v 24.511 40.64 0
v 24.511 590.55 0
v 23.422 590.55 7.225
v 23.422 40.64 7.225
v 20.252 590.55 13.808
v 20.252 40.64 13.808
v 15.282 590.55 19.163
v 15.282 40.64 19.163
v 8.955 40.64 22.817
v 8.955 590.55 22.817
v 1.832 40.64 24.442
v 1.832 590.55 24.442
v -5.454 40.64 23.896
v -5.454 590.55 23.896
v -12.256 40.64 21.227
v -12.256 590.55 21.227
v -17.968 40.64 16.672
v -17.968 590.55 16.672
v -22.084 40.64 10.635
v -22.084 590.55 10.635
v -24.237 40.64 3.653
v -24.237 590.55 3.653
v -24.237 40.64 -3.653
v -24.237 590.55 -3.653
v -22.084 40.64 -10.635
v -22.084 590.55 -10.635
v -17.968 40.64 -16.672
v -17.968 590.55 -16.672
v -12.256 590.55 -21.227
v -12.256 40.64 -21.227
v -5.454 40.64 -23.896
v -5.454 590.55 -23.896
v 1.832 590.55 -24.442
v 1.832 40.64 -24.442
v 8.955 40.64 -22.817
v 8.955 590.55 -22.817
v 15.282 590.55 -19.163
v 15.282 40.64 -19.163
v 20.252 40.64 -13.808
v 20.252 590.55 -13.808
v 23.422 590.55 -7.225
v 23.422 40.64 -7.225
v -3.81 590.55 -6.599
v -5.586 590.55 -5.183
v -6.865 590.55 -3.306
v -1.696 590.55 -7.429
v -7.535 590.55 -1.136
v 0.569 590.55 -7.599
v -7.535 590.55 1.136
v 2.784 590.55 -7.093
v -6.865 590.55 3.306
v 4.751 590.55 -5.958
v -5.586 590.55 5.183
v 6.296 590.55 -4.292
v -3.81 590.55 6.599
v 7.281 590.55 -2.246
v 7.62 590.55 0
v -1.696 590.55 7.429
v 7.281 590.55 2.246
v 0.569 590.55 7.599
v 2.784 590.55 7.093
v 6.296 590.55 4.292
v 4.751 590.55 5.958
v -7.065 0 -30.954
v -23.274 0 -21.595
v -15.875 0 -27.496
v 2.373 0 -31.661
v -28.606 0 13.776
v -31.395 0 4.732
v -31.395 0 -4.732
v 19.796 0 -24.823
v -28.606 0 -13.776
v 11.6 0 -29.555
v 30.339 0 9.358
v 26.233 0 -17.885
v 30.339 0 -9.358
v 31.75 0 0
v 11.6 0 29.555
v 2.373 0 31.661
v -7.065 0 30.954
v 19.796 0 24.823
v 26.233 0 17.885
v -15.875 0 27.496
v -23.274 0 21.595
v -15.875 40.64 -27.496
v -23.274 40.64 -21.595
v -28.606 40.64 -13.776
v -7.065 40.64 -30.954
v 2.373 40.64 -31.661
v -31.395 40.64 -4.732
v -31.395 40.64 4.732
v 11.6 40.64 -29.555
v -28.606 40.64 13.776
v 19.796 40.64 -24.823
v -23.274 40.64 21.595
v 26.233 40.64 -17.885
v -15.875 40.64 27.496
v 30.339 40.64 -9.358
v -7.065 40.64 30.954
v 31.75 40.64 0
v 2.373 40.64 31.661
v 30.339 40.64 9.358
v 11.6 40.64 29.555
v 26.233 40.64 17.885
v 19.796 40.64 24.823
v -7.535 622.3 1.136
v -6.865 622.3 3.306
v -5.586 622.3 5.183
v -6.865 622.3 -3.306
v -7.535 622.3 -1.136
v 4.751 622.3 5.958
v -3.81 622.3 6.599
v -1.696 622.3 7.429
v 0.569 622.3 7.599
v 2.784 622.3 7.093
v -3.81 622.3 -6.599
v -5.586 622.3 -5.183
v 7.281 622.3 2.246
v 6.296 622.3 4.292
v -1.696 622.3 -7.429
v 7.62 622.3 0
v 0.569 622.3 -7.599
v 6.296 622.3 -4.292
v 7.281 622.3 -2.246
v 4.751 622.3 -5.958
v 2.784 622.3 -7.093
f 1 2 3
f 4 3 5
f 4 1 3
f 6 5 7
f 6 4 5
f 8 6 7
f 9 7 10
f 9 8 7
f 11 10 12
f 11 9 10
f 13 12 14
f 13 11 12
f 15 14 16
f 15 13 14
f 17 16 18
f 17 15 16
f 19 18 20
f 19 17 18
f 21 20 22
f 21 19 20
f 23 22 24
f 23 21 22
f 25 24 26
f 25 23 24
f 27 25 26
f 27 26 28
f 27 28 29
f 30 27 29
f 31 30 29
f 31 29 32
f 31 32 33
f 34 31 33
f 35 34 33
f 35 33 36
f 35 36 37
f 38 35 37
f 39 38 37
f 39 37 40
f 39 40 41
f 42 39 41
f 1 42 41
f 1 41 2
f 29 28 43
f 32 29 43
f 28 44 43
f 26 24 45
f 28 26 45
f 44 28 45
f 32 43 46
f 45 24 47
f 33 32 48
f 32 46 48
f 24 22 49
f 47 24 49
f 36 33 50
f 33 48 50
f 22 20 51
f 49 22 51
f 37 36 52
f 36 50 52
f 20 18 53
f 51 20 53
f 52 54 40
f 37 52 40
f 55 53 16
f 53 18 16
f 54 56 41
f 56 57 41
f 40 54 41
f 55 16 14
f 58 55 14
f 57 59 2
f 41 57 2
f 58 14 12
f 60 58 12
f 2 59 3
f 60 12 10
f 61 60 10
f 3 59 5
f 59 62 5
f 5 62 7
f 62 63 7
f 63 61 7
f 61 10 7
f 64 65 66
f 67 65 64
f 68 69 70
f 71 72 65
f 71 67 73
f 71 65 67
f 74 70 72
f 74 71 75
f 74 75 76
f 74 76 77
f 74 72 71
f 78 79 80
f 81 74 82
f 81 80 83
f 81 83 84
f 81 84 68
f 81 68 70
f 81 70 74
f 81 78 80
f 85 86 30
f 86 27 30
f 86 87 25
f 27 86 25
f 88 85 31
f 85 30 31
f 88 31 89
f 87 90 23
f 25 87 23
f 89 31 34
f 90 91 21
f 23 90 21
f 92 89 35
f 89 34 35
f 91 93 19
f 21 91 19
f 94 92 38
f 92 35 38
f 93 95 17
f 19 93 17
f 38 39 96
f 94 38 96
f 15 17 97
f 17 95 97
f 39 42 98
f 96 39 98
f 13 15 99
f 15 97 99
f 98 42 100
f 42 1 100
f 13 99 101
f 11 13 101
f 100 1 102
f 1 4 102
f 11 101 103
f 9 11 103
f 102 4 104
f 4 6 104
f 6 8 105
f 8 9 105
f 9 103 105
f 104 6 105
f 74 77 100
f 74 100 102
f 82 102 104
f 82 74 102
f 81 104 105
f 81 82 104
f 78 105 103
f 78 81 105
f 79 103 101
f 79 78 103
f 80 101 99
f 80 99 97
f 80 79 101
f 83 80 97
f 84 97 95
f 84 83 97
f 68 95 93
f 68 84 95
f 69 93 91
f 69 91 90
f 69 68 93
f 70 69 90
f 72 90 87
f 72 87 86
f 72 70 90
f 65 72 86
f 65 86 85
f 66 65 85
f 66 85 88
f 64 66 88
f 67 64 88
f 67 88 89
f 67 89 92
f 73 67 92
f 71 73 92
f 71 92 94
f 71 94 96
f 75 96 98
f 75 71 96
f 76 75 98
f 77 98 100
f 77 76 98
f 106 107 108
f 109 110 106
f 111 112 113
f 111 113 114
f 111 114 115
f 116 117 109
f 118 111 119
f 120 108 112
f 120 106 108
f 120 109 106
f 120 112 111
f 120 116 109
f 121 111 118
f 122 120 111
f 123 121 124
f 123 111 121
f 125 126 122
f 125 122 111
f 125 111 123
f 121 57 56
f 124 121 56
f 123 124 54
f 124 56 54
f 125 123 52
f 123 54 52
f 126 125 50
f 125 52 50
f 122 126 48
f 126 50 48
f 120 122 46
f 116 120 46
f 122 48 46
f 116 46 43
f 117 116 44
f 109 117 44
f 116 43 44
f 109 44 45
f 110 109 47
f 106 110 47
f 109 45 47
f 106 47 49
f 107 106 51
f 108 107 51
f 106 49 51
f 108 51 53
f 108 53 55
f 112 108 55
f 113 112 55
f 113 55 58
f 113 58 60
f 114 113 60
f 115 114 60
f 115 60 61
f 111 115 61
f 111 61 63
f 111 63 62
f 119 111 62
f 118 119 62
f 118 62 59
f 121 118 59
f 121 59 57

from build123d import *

# Parameters (mm, degrees)
SKETCH1_R           = 7.62
BOSS_EXTRUDE1_DEPTH = 622.3
SKETCH2_R           = 24.511
BOSS_EXTRUDE2_DEPTH = 590.55
SKETCH3_R           = 31.75
BOSS_EXTRUDE3_DEPTH = 40.64


with BuildPart() as part:
    # Sketch1 → Boss-Extrude1 (new body)
    with BuildSketch(Plane(origin=(0, 0, 0), x_dir=(1, 0, 0), z_dir=(0, 1, 0))):
        Circle(SKETCH1_R)
    extrude(amount=BOSS_EXTRUDE1_DEPTH)

    # Sketch2 → Boss-Extrude2 (add)
    with BuildSketch(Plane.XZ):
        Circle(SKETCH2_R)
    extrude(amount=-BOSS_EXTRUDE2_DEPTH)

    # Sketch3 → Boss-Extrude3 (add)
    with BuildSketch(Plane.XZ):
        Circle(SKETCH3_R)
    extrude(amount=-BOSS_EXTRUDE3_DEPTH)


solid = part.part
